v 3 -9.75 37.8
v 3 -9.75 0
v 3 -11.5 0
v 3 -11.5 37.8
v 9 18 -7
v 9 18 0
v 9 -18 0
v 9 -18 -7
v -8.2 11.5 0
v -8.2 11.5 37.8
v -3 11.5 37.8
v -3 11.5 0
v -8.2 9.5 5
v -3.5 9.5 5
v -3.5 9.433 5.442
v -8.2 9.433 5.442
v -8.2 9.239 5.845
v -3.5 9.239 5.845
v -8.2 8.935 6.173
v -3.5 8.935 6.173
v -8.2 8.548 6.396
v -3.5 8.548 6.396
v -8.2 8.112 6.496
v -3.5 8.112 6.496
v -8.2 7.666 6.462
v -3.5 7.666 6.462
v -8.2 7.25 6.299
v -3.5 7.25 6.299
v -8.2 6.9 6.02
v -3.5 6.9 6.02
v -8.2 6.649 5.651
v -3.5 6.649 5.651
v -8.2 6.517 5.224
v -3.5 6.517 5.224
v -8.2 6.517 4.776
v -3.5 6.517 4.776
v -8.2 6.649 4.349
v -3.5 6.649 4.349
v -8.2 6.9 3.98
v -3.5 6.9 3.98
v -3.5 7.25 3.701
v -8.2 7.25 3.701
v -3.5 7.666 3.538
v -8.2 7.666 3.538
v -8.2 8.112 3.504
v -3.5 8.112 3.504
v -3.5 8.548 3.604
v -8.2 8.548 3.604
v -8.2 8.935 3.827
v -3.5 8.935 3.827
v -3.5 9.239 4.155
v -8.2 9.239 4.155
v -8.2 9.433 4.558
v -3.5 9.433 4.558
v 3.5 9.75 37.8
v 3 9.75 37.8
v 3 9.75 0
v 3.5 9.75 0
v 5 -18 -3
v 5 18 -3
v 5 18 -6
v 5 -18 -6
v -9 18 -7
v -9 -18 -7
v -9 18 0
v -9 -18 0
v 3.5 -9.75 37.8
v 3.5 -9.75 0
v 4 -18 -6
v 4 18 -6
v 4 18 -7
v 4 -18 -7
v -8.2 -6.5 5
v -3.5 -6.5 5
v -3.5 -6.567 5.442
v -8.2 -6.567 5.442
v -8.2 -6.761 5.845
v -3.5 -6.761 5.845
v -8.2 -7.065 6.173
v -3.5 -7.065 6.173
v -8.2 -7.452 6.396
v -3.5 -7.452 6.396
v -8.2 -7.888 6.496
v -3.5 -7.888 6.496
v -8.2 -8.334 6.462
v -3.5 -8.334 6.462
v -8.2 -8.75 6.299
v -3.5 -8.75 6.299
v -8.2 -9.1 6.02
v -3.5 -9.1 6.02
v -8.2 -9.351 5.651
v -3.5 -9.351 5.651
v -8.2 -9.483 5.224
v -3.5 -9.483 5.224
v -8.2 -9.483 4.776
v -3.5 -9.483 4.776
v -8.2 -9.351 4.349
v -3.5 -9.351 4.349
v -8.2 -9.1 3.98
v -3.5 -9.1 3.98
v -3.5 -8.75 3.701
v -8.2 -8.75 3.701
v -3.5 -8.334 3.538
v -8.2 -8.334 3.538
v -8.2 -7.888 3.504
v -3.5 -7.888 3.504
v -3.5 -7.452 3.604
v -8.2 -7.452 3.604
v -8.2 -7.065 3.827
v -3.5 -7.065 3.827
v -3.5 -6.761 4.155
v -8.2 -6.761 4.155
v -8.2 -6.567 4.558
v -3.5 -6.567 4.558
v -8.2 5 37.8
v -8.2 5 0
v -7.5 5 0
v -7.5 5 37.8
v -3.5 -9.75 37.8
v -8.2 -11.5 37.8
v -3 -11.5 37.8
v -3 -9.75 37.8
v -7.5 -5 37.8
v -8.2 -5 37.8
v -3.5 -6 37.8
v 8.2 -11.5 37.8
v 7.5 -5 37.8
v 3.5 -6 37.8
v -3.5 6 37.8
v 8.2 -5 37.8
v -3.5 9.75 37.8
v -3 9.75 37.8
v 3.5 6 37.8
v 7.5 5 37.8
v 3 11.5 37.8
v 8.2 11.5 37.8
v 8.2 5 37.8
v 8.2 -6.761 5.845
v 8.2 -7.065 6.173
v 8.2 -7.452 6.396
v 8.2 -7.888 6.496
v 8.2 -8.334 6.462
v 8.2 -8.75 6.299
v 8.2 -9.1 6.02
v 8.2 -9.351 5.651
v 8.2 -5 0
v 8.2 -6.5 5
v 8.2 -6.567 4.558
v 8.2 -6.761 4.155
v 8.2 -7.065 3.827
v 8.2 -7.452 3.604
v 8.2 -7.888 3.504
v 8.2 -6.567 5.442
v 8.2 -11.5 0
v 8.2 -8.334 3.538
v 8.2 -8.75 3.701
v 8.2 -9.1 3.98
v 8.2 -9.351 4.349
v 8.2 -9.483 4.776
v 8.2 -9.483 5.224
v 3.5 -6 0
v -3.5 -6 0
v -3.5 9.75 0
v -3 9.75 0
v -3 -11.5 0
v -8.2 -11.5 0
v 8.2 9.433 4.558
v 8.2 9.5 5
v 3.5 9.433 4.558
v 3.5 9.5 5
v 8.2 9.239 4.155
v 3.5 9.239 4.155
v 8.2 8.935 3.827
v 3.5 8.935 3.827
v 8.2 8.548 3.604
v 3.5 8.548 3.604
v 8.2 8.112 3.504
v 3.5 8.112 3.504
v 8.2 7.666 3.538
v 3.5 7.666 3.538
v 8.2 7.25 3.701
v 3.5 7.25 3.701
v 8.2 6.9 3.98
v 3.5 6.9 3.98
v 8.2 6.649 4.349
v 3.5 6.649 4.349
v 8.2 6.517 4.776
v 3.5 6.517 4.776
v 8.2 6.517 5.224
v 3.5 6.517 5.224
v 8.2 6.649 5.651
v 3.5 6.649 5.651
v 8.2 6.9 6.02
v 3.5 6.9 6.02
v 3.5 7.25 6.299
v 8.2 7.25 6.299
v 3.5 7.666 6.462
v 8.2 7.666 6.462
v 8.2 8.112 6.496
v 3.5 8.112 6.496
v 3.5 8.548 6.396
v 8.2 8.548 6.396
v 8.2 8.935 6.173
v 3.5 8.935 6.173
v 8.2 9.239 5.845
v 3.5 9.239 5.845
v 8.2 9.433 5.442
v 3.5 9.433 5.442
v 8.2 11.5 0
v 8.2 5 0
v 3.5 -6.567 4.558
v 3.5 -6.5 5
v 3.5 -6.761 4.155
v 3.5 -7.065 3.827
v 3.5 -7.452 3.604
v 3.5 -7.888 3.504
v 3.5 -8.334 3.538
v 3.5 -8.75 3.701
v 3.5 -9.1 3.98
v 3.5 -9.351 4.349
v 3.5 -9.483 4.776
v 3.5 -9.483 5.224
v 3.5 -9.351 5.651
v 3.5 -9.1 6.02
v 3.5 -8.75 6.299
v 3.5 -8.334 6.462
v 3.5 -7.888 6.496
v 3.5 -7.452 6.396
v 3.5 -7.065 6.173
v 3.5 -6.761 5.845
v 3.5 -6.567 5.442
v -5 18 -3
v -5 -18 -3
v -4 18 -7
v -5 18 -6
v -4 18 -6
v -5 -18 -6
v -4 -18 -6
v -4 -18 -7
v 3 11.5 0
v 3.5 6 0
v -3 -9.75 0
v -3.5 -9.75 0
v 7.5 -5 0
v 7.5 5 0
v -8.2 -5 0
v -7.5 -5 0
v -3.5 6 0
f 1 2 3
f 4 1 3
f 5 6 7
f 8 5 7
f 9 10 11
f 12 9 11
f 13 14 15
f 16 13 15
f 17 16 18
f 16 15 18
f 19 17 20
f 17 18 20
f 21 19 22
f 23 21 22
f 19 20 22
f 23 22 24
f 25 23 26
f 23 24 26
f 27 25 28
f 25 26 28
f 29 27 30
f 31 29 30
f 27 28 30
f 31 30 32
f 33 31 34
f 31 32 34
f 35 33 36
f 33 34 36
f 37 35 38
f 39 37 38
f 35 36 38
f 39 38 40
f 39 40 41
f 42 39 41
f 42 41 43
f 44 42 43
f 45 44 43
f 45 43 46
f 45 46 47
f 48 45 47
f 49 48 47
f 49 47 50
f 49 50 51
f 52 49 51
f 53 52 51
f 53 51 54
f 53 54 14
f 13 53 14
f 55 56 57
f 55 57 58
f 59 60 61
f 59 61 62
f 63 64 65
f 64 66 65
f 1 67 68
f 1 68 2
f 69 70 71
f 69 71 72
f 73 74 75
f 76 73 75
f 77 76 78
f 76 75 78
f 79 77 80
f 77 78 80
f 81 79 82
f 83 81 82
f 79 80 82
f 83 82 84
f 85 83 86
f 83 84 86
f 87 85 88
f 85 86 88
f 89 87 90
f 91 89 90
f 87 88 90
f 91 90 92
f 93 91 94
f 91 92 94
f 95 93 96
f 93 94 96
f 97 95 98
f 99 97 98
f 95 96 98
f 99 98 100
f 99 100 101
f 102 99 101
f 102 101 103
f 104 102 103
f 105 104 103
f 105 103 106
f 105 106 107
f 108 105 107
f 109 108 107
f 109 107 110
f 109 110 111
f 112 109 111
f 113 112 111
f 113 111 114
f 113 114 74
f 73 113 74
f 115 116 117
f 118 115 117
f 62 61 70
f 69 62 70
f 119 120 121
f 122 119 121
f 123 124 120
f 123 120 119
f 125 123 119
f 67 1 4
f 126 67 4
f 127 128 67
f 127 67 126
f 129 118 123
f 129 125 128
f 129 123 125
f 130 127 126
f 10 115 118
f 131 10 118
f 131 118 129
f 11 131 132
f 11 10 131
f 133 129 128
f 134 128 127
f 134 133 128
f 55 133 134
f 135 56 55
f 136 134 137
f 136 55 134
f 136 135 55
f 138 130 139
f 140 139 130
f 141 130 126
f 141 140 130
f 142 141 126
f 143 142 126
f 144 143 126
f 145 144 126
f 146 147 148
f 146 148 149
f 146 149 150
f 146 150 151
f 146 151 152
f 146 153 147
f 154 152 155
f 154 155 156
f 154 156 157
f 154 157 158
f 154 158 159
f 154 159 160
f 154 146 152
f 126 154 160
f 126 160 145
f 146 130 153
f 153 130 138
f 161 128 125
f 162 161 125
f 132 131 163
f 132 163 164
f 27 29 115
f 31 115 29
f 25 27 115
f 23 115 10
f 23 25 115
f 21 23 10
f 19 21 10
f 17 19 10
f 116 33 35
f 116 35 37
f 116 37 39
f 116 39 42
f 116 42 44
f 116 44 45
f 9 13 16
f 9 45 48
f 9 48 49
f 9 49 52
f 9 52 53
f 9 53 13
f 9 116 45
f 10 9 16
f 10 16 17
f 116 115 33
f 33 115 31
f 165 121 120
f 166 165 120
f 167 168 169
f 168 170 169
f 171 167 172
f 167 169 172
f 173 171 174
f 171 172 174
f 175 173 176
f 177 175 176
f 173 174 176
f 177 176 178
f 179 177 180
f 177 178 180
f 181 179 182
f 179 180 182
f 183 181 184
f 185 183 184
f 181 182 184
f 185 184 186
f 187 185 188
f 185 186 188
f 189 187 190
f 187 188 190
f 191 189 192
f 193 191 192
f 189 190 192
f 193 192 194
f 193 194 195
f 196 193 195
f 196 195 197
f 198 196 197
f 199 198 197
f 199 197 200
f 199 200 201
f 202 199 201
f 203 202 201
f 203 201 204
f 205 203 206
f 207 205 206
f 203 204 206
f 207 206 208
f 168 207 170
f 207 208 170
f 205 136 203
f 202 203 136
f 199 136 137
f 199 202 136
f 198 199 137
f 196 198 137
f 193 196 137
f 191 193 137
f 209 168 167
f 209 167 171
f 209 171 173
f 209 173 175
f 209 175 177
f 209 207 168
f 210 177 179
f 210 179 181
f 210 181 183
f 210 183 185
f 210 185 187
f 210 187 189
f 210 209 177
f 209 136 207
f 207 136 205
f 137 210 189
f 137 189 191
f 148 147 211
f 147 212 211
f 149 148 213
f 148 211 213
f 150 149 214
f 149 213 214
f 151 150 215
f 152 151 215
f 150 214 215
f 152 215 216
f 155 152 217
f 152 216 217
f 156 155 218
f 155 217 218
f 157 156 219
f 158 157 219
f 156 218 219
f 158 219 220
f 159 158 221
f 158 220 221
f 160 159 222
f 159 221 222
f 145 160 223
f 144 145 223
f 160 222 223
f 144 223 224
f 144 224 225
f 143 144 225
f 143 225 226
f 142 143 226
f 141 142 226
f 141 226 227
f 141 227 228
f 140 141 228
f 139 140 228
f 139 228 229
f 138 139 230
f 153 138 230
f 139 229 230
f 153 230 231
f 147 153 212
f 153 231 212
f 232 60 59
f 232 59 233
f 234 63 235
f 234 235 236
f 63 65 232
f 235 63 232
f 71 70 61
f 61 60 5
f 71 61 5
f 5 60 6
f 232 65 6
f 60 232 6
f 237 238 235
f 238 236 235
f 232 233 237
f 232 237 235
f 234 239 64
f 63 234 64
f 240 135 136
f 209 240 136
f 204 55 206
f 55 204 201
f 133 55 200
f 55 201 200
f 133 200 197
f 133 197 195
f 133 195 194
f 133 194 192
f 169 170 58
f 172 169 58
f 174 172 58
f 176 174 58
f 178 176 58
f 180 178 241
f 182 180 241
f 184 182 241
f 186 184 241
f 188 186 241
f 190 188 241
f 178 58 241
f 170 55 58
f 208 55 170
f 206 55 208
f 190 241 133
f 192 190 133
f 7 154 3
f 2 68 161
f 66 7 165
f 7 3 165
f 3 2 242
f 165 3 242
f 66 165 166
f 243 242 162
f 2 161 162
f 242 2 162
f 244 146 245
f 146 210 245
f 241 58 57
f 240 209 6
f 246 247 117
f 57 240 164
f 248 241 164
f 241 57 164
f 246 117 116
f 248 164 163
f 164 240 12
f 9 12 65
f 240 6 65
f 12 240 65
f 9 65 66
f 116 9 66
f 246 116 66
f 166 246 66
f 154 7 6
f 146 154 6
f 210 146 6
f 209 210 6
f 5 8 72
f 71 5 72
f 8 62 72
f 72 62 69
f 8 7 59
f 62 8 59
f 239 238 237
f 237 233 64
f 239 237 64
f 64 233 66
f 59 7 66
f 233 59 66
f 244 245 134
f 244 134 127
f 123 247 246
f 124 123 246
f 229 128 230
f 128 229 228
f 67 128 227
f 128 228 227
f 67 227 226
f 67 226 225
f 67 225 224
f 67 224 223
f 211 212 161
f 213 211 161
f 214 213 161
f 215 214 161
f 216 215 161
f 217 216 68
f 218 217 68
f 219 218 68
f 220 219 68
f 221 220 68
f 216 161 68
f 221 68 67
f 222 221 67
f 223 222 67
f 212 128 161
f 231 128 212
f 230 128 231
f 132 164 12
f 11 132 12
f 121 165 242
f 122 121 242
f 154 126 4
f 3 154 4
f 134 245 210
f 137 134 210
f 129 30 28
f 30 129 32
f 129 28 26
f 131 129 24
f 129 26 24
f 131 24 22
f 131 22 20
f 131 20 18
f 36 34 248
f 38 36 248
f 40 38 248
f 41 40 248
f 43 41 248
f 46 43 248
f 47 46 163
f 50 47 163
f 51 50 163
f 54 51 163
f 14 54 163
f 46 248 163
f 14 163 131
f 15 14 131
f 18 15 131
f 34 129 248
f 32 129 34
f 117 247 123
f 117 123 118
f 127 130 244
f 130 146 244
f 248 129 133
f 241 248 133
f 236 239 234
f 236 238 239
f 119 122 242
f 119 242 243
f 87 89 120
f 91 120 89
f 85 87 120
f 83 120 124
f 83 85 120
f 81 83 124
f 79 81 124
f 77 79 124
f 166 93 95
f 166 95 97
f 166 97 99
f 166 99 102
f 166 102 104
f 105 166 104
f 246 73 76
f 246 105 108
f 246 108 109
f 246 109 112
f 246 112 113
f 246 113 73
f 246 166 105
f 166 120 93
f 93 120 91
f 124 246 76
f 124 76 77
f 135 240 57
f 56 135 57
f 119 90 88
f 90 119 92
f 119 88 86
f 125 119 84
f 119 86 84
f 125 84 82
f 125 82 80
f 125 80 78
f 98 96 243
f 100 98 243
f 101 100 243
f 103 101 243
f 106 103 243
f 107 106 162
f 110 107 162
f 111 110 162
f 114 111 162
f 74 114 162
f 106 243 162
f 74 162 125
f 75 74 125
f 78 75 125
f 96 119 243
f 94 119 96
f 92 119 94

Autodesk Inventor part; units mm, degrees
ref_plane "XY Plane" through (0, 0, 0) normal (0, 0, 1) x (1, 0, 0)
sketch "Sketch1" plane through (0, 0, 0) normal (0, 0, 1) x (1, 0, 0)
  line L0 (8.2, -11.5) -> (-8.2, -11.5)
  line L1 (-8.2, -11.5) -> (-8.2, 11.5)
  line L2 (-8.2, 11.5) -> (8.2, 11.5)
  line L3 (8.2, 11.5) -> (8.2, -11.5)
  line L4 (8.2, -11.5) -> (-8.2, 11.5) construction
  line L5 (-8.2, -11.5) -> (8.2, 11.5) construction
  line L6 (8.2, -5) -> (-8.2, -5)
  line L7 (-8.2, -5) -> (-8.2, 5)
  line L8 (-8.2, 5) -> (8.2, 5)
  line L9 (8.2, 5) -> (8.2, -5)
  line L10 (8.2, -5) -> (-8.2, 5) construction
  line L11 (-8.2, -5) -> (8.2, 5) construction
  line L12 (7.5, -5) -> (-7.5, -5)
  line L13 (-7.5, -5) -> (-7.5, 5)
  line L14 (-7.5, 5) -> (7.5, 5)
  line L15 (7.5, 5) -> (7.5, -5)
  line L16 (7.5, -5) -> (-7.5, 5) construction
  line L17 (-7.5, -5) -> (7.5, 5) construction
  line L18 (3, -11.5) -> (-3, -11.5)
  line L19 (-3, -11.5) -> (-3, 11.5)
  line L20 (-3, 11.5) -> (3, 11.5)
  line L21 (3, 11.5) -> (3, -11.5)
  line L22 (3, -11.5) -> (-3, 11.5) construction
  line L23 (-3, -11.5) -> (3, 11.5) construction
  line L24 (3.5, -9.75) -> (-3.5, -9.75)
  line L25 (-3.5, -9.75) -> (-3.5, 9.75)
  line L26 (-3.5, 9.75) -> (3.5, 9.75)
  line L27 (3.5, 9.75) -> (3.5, -9.75)
  line L28 (3.5, -9.75) -> (-3.5, 9.75) construction
  line L29 (-3.5, -9.75) -> (3.5, 9.75) construction
  line L30 (3.5, -6) -> (-3.5, -6)
  line L31 (-3.5, -6) -> (-3.5, 6)
  line L32 (-3.5, 6) -> (3.5, 6)
  line L33 (3.5, 6) -> (3.5, -6)
  line L34 (3.5, -6) -> (-3.5, 6) construction
  line L35 (-3.5, -6) -> (3.5, 6) construction
  point P0 (0, 0)
  point P1 (-3, -9.75)
  point P2 (3, -9.75)
  point P3 (3, 9.75)
  point P4 (-3, 9.75)
  dimension "d0" = 23
  dimension "d1" = 16.4
  dimension "d2" = 10
  dimension "d3" = 15
  dimension "d4" = 6
  dimension "d5" = 19.5
  dimension "d6" = 7
  dimension "d7" = 12
extrude "Extrusion1" add sketch "Sketch1" along normal blind 37.8 contours L0 L21 L24 L27 L6 L3 | L0 L1 L6 L25 L24 L19 | L8 L27 L26 L21 L2 L3 | L6 L27 L8 L15 | L30 L19 L6 L21 | L21 L6 L27 L30 | L6 L21 L8 L27 | L30 L25 L6 L19 | L6 L19 L8 L21 | L8 L21 L32 L27 | L1 L2 L19 L26 L25 L8 | L13 L8 L25 L6 | L6 L25 L8 L19 | L8 L19 L32 L21 | L8 L25 L32 L19
sketch "Sketch2" plane through (0, 0, 0) normal (1, 0, 0) x (0, 1, 0)
  circle A0 centre (-8, 5) radius 1.5
  circle A1 centre (8, 5) radius 1.5
  line L0 (-6, 0) -> (-6, 37.8) projected
  line L1 (6, 10) -> (-6, 10)
  line L2 (-6, 10) -> (-6, 0)
  line L3 (-6, 0) -> (6, 0)
  line L4 (6, 0) -> (6, 10)
  line L5 (6, 10) -> (-6, 0) construction
  line L6 (-6, 10) -> (6, 0) construction
  point P0 (0, 0)
  point P1 (0, 5)
  point P2 (-6, 10)
  dimension "d10" = 3
  dimension "d11" = 3
  dimension "d12" = 16
  dimension "d13" = 8
  dimension "d14" = 5
  dimension "d17" = 10
extrude "Extrusion2" cut sketch "Sketch2" along normal through all both and the other way through all contours A0 | A1
sketch "Sketch3" plane through (0, 0, 0) normal (0, 0, -1) x (-1, 0, 0)
  line L0 (5, 18) -> (-5, 18)
  line L1 (-5, 18) -> (-5, -18)
  line L2 (-5, -18) -> (5, -18)
  line L3 (5, -18) -> (5, 18)
  line L4 (5, 18) -> (-5, -18) construction
  line L5 (-5, 18) -> (5, -18) construction
  line L6 (9, 18) -> (-9, 18)
  line L7 (-9, 18) -> (-9, -18)
  line L8 (-9, -18) -> (9, -18)
  line L9 (9, -18) -> (9, 18)
  line L10 (9, 18) -> (-9, -18) construction
  line L11 (-9, 18) -> (9, -18) construction
  line L12 (4, 18) -> (-4, 18)
  line L13 (-4, 18) -> (-4, -18)
  line L14 (-4, -18) -> (4, -18)
  line L15 (4, -18) -> (4, 18)
  line L16 (4, 18) -> (-4, -18) construction
  line L17 (-4, 18) -> (4, -18) construction
  point P0 (0, 0)
  point P1 (0, 18)
  point P2 (-5, 18)
  dimension "d20" = 10
  dimension "d21" = 18
  dimension "d22" = 36
  dimension "d23" = 36
  dimension "d24" = 8
extrude "Extrusion4" add sketch "Sketch3" along normal blind 7 contours L3 L2 L15 L0 | L6 L9 L8 L3 | L13 L2 L1 L0 | L1 L8 L7 L6
extrude "Extrusion5" cut sketch "Sketch3" along normal blind 6 contours L3 L2 L15 L0 | L13 L2 L1 L0
extrude "Extrusion6" add sketch "Sketch3" along normal blind 3 contours L3 L2 L15 L0 | L15 L2 L13 L0 | L13 L2 L1 L0
properties part number "Cylinder" material "Aluminum 6061"
